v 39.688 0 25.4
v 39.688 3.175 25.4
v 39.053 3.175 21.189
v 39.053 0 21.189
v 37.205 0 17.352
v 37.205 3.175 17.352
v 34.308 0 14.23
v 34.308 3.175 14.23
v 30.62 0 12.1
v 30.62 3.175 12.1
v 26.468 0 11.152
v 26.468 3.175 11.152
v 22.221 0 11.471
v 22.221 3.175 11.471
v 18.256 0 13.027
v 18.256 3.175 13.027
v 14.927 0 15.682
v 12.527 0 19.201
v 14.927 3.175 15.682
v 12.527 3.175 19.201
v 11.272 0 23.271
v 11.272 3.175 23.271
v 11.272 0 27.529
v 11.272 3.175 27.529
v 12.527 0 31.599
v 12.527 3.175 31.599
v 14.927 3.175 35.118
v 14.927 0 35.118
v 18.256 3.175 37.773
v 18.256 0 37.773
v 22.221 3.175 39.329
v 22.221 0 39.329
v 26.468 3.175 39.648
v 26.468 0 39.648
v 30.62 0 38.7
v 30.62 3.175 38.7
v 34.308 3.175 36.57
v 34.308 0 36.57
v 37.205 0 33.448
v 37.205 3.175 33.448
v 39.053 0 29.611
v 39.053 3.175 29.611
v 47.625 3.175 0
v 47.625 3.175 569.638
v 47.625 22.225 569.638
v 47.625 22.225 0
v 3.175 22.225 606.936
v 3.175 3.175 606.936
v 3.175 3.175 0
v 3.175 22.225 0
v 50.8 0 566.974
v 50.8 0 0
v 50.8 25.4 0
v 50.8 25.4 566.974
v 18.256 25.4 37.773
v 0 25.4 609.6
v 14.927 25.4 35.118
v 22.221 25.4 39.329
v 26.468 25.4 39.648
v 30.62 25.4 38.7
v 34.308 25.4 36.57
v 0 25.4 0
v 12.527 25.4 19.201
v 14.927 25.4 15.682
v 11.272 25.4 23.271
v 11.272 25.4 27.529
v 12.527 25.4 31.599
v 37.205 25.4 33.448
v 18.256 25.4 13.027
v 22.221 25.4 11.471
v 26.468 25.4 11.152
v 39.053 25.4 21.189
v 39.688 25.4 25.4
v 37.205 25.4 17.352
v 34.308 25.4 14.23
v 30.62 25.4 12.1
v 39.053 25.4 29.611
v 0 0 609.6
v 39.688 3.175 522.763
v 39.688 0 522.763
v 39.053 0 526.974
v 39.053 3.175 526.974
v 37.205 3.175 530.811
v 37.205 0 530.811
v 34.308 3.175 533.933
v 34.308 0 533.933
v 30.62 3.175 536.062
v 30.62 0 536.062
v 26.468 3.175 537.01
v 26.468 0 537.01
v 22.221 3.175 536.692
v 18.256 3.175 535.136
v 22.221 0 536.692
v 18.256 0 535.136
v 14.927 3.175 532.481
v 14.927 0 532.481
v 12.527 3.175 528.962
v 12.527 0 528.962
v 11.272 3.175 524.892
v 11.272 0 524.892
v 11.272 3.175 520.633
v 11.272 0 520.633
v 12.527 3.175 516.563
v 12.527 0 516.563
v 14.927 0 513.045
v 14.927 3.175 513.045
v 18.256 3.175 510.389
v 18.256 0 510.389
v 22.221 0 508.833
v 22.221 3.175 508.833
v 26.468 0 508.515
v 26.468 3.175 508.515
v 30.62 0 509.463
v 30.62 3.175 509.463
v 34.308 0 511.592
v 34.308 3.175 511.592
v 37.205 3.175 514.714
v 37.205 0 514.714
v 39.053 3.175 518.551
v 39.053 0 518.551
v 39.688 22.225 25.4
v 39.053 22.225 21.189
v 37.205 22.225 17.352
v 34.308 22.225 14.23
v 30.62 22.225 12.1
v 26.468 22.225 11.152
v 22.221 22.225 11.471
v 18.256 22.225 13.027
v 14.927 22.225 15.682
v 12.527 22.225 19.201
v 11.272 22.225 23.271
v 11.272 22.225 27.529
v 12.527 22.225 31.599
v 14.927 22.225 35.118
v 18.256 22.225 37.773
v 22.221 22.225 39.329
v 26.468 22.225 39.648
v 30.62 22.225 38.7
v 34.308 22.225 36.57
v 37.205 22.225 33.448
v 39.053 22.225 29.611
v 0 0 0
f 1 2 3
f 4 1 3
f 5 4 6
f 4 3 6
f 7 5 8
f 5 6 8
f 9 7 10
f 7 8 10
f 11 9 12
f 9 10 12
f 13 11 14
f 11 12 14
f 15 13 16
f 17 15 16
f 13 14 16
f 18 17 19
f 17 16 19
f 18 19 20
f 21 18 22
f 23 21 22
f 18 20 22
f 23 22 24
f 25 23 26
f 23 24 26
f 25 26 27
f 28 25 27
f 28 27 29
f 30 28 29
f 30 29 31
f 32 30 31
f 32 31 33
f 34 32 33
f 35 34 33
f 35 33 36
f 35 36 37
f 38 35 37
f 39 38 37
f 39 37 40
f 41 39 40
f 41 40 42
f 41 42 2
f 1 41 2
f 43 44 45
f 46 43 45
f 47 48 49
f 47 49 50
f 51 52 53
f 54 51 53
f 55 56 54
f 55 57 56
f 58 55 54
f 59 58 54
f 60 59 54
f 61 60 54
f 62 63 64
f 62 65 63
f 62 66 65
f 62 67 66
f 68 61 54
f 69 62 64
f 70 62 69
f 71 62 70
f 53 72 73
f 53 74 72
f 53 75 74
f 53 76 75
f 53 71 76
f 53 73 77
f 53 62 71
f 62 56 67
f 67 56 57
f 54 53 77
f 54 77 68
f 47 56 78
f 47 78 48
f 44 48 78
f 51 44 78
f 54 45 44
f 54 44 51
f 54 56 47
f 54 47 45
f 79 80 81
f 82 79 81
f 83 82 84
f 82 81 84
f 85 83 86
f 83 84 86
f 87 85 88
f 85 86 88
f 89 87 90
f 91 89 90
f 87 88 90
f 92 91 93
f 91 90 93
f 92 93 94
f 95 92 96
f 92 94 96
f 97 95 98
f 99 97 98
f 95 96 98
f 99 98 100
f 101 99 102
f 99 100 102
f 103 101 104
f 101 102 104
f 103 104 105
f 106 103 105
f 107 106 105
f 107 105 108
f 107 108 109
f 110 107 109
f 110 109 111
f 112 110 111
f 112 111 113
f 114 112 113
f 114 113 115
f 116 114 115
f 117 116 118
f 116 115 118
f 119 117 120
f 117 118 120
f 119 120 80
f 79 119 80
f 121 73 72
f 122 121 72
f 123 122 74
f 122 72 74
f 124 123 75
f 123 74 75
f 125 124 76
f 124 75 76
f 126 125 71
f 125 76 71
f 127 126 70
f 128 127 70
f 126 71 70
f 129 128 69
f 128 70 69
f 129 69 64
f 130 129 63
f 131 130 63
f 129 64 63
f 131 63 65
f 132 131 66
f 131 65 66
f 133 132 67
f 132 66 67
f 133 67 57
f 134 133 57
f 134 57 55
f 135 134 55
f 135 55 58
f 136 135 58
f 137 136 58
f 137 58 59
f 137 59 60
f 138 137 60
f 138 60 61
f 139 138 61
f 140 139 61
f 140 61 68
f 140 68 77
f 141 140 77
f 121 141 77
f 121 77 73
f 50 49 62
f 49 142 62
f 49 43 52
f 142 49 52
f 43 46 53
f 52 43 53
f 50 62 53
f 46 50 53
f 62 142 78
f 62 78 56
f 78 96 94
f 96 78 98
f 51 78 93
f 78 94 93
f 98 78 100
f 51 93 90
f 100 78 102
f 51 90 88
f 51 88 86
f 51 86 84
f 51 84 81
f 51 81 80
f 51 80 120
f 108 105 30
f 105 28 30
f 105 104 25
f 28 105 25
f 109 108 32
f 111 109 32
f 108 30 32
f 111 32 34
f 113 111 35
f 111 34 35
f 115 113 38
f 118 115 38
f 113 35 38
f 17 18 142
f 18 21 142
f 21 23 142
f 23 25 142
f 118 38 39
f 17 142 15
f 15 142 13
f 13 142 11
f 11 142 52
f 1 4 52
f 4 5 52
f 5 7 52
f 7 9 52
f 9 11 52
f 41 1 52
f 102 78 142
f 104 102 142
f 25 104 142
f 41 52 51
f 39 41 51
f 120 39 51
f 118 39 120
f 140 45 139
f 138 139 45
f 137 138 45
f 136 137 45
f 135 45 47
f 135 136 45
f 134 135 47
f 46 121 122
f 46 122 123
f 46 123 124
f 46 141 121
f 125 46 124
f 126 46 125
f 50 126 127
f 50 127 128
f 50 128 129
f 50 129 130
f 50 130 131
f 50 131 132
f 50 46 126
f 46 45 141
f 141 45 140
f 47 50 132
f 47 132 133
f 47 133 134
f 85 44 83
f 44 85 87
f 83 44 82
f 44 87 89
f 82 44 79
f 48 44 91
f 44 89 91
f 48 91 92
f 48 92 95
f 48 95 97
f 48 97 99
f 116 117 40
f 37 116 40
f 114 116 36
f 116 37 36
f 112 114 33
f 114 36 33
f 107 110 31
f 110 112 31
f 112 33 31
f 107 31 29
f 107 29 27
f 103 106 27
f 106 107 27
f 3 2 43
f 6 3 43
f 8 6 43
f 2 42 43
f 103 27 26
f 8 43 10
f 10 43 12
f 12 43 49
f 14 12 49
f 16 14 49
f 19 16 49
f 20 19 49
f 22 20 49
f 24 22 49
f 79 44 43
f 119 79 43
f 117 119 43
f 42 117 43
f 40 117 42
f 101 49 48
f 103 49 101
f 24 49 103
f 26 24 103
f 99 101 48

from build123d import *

# Parameters (mm, degrees)
SKETCH1_W           = 50.8
SKETCH1_H           = 25.4
BOSS_EXTRUDE1_DEPTH = 609.6
SKETCH2_W           = 44.45
SKETCH2_H           = 19.05
CUT_EXTRUDE1_DEPTH  = 609.6
SKETCH6_R           = 14.2875
CUT_EXTRUDE5_DEPTH  = 25.4
CUT_EXTRUDE6_DEPTH  = 25.4
SKETCH8_R           = 14.2875
CUT_EXTRUDE7_DEPTH  = 3.175


with BuildPart() as part:
    # Sketch1 → Boss-Extrude1 (new body)
    with BuildSketch(Plane.XY):
        with Locations((25.4, 12.7)):
            Rectangle(SKETCH1_W, SKETCH1_H)
    extrude(amount=BOSS_EXTRUDE1_DEPTH)

    # Sketch2 → Cut-Extrude1 (cut)
    with BuildSketch(Plane(origin=(0, 0, 0), x_dir=(-1, 0, 0), z_dir=(0, 0, -1))):
        with Locations((-25.4, 12.7)):
            Rectangle(SKETCH2_W, SKETCH2_H)
    extrude(amount=-CUT_EXTRUDE1_DEPTH, mode=Mode.SUBTRACT)

    # Sketch6 → Cut-Extrude5 (cut)
    with BuildSketch(Plane(origin=(0, 25.4, 0), x_dir=(1, 0, 0), z_dir=(0, 1, 0))):
        with Locations((25.4, -25.4)):
            Circle(SKETCH6_R)
    extrude(amount=-CUT_EXTRUDE5_DEPTH, mode=Mode.SUBTRACT)

    # Sketch7 → Cut-Extrude6 (cut)
    with BuildSketch(Plane(origin=(0, 25.4, 0), x_dir=(1, 0, 0), z_dir=(0, 1, 0))):
        Polygon((50.8, -566.973738736), (50.8, -609.6), (0, -609.6), align=None)
    extrude(amount=-CUT_EXTRUDE6_DEPTH, mode=Mode.SUBTRACT)

    # Sketch8 → Cut-Extrude7 (cut)
    with BuildSketch(Plane.XZ):
        with Locations((25.4, 522.762581257)):
            Circle(SKETCH8_R)
    extrude(amount=-CUT_EXTRUDE7_DEPTH, mode=Mode.SUBTRACT)


solid = part.part
